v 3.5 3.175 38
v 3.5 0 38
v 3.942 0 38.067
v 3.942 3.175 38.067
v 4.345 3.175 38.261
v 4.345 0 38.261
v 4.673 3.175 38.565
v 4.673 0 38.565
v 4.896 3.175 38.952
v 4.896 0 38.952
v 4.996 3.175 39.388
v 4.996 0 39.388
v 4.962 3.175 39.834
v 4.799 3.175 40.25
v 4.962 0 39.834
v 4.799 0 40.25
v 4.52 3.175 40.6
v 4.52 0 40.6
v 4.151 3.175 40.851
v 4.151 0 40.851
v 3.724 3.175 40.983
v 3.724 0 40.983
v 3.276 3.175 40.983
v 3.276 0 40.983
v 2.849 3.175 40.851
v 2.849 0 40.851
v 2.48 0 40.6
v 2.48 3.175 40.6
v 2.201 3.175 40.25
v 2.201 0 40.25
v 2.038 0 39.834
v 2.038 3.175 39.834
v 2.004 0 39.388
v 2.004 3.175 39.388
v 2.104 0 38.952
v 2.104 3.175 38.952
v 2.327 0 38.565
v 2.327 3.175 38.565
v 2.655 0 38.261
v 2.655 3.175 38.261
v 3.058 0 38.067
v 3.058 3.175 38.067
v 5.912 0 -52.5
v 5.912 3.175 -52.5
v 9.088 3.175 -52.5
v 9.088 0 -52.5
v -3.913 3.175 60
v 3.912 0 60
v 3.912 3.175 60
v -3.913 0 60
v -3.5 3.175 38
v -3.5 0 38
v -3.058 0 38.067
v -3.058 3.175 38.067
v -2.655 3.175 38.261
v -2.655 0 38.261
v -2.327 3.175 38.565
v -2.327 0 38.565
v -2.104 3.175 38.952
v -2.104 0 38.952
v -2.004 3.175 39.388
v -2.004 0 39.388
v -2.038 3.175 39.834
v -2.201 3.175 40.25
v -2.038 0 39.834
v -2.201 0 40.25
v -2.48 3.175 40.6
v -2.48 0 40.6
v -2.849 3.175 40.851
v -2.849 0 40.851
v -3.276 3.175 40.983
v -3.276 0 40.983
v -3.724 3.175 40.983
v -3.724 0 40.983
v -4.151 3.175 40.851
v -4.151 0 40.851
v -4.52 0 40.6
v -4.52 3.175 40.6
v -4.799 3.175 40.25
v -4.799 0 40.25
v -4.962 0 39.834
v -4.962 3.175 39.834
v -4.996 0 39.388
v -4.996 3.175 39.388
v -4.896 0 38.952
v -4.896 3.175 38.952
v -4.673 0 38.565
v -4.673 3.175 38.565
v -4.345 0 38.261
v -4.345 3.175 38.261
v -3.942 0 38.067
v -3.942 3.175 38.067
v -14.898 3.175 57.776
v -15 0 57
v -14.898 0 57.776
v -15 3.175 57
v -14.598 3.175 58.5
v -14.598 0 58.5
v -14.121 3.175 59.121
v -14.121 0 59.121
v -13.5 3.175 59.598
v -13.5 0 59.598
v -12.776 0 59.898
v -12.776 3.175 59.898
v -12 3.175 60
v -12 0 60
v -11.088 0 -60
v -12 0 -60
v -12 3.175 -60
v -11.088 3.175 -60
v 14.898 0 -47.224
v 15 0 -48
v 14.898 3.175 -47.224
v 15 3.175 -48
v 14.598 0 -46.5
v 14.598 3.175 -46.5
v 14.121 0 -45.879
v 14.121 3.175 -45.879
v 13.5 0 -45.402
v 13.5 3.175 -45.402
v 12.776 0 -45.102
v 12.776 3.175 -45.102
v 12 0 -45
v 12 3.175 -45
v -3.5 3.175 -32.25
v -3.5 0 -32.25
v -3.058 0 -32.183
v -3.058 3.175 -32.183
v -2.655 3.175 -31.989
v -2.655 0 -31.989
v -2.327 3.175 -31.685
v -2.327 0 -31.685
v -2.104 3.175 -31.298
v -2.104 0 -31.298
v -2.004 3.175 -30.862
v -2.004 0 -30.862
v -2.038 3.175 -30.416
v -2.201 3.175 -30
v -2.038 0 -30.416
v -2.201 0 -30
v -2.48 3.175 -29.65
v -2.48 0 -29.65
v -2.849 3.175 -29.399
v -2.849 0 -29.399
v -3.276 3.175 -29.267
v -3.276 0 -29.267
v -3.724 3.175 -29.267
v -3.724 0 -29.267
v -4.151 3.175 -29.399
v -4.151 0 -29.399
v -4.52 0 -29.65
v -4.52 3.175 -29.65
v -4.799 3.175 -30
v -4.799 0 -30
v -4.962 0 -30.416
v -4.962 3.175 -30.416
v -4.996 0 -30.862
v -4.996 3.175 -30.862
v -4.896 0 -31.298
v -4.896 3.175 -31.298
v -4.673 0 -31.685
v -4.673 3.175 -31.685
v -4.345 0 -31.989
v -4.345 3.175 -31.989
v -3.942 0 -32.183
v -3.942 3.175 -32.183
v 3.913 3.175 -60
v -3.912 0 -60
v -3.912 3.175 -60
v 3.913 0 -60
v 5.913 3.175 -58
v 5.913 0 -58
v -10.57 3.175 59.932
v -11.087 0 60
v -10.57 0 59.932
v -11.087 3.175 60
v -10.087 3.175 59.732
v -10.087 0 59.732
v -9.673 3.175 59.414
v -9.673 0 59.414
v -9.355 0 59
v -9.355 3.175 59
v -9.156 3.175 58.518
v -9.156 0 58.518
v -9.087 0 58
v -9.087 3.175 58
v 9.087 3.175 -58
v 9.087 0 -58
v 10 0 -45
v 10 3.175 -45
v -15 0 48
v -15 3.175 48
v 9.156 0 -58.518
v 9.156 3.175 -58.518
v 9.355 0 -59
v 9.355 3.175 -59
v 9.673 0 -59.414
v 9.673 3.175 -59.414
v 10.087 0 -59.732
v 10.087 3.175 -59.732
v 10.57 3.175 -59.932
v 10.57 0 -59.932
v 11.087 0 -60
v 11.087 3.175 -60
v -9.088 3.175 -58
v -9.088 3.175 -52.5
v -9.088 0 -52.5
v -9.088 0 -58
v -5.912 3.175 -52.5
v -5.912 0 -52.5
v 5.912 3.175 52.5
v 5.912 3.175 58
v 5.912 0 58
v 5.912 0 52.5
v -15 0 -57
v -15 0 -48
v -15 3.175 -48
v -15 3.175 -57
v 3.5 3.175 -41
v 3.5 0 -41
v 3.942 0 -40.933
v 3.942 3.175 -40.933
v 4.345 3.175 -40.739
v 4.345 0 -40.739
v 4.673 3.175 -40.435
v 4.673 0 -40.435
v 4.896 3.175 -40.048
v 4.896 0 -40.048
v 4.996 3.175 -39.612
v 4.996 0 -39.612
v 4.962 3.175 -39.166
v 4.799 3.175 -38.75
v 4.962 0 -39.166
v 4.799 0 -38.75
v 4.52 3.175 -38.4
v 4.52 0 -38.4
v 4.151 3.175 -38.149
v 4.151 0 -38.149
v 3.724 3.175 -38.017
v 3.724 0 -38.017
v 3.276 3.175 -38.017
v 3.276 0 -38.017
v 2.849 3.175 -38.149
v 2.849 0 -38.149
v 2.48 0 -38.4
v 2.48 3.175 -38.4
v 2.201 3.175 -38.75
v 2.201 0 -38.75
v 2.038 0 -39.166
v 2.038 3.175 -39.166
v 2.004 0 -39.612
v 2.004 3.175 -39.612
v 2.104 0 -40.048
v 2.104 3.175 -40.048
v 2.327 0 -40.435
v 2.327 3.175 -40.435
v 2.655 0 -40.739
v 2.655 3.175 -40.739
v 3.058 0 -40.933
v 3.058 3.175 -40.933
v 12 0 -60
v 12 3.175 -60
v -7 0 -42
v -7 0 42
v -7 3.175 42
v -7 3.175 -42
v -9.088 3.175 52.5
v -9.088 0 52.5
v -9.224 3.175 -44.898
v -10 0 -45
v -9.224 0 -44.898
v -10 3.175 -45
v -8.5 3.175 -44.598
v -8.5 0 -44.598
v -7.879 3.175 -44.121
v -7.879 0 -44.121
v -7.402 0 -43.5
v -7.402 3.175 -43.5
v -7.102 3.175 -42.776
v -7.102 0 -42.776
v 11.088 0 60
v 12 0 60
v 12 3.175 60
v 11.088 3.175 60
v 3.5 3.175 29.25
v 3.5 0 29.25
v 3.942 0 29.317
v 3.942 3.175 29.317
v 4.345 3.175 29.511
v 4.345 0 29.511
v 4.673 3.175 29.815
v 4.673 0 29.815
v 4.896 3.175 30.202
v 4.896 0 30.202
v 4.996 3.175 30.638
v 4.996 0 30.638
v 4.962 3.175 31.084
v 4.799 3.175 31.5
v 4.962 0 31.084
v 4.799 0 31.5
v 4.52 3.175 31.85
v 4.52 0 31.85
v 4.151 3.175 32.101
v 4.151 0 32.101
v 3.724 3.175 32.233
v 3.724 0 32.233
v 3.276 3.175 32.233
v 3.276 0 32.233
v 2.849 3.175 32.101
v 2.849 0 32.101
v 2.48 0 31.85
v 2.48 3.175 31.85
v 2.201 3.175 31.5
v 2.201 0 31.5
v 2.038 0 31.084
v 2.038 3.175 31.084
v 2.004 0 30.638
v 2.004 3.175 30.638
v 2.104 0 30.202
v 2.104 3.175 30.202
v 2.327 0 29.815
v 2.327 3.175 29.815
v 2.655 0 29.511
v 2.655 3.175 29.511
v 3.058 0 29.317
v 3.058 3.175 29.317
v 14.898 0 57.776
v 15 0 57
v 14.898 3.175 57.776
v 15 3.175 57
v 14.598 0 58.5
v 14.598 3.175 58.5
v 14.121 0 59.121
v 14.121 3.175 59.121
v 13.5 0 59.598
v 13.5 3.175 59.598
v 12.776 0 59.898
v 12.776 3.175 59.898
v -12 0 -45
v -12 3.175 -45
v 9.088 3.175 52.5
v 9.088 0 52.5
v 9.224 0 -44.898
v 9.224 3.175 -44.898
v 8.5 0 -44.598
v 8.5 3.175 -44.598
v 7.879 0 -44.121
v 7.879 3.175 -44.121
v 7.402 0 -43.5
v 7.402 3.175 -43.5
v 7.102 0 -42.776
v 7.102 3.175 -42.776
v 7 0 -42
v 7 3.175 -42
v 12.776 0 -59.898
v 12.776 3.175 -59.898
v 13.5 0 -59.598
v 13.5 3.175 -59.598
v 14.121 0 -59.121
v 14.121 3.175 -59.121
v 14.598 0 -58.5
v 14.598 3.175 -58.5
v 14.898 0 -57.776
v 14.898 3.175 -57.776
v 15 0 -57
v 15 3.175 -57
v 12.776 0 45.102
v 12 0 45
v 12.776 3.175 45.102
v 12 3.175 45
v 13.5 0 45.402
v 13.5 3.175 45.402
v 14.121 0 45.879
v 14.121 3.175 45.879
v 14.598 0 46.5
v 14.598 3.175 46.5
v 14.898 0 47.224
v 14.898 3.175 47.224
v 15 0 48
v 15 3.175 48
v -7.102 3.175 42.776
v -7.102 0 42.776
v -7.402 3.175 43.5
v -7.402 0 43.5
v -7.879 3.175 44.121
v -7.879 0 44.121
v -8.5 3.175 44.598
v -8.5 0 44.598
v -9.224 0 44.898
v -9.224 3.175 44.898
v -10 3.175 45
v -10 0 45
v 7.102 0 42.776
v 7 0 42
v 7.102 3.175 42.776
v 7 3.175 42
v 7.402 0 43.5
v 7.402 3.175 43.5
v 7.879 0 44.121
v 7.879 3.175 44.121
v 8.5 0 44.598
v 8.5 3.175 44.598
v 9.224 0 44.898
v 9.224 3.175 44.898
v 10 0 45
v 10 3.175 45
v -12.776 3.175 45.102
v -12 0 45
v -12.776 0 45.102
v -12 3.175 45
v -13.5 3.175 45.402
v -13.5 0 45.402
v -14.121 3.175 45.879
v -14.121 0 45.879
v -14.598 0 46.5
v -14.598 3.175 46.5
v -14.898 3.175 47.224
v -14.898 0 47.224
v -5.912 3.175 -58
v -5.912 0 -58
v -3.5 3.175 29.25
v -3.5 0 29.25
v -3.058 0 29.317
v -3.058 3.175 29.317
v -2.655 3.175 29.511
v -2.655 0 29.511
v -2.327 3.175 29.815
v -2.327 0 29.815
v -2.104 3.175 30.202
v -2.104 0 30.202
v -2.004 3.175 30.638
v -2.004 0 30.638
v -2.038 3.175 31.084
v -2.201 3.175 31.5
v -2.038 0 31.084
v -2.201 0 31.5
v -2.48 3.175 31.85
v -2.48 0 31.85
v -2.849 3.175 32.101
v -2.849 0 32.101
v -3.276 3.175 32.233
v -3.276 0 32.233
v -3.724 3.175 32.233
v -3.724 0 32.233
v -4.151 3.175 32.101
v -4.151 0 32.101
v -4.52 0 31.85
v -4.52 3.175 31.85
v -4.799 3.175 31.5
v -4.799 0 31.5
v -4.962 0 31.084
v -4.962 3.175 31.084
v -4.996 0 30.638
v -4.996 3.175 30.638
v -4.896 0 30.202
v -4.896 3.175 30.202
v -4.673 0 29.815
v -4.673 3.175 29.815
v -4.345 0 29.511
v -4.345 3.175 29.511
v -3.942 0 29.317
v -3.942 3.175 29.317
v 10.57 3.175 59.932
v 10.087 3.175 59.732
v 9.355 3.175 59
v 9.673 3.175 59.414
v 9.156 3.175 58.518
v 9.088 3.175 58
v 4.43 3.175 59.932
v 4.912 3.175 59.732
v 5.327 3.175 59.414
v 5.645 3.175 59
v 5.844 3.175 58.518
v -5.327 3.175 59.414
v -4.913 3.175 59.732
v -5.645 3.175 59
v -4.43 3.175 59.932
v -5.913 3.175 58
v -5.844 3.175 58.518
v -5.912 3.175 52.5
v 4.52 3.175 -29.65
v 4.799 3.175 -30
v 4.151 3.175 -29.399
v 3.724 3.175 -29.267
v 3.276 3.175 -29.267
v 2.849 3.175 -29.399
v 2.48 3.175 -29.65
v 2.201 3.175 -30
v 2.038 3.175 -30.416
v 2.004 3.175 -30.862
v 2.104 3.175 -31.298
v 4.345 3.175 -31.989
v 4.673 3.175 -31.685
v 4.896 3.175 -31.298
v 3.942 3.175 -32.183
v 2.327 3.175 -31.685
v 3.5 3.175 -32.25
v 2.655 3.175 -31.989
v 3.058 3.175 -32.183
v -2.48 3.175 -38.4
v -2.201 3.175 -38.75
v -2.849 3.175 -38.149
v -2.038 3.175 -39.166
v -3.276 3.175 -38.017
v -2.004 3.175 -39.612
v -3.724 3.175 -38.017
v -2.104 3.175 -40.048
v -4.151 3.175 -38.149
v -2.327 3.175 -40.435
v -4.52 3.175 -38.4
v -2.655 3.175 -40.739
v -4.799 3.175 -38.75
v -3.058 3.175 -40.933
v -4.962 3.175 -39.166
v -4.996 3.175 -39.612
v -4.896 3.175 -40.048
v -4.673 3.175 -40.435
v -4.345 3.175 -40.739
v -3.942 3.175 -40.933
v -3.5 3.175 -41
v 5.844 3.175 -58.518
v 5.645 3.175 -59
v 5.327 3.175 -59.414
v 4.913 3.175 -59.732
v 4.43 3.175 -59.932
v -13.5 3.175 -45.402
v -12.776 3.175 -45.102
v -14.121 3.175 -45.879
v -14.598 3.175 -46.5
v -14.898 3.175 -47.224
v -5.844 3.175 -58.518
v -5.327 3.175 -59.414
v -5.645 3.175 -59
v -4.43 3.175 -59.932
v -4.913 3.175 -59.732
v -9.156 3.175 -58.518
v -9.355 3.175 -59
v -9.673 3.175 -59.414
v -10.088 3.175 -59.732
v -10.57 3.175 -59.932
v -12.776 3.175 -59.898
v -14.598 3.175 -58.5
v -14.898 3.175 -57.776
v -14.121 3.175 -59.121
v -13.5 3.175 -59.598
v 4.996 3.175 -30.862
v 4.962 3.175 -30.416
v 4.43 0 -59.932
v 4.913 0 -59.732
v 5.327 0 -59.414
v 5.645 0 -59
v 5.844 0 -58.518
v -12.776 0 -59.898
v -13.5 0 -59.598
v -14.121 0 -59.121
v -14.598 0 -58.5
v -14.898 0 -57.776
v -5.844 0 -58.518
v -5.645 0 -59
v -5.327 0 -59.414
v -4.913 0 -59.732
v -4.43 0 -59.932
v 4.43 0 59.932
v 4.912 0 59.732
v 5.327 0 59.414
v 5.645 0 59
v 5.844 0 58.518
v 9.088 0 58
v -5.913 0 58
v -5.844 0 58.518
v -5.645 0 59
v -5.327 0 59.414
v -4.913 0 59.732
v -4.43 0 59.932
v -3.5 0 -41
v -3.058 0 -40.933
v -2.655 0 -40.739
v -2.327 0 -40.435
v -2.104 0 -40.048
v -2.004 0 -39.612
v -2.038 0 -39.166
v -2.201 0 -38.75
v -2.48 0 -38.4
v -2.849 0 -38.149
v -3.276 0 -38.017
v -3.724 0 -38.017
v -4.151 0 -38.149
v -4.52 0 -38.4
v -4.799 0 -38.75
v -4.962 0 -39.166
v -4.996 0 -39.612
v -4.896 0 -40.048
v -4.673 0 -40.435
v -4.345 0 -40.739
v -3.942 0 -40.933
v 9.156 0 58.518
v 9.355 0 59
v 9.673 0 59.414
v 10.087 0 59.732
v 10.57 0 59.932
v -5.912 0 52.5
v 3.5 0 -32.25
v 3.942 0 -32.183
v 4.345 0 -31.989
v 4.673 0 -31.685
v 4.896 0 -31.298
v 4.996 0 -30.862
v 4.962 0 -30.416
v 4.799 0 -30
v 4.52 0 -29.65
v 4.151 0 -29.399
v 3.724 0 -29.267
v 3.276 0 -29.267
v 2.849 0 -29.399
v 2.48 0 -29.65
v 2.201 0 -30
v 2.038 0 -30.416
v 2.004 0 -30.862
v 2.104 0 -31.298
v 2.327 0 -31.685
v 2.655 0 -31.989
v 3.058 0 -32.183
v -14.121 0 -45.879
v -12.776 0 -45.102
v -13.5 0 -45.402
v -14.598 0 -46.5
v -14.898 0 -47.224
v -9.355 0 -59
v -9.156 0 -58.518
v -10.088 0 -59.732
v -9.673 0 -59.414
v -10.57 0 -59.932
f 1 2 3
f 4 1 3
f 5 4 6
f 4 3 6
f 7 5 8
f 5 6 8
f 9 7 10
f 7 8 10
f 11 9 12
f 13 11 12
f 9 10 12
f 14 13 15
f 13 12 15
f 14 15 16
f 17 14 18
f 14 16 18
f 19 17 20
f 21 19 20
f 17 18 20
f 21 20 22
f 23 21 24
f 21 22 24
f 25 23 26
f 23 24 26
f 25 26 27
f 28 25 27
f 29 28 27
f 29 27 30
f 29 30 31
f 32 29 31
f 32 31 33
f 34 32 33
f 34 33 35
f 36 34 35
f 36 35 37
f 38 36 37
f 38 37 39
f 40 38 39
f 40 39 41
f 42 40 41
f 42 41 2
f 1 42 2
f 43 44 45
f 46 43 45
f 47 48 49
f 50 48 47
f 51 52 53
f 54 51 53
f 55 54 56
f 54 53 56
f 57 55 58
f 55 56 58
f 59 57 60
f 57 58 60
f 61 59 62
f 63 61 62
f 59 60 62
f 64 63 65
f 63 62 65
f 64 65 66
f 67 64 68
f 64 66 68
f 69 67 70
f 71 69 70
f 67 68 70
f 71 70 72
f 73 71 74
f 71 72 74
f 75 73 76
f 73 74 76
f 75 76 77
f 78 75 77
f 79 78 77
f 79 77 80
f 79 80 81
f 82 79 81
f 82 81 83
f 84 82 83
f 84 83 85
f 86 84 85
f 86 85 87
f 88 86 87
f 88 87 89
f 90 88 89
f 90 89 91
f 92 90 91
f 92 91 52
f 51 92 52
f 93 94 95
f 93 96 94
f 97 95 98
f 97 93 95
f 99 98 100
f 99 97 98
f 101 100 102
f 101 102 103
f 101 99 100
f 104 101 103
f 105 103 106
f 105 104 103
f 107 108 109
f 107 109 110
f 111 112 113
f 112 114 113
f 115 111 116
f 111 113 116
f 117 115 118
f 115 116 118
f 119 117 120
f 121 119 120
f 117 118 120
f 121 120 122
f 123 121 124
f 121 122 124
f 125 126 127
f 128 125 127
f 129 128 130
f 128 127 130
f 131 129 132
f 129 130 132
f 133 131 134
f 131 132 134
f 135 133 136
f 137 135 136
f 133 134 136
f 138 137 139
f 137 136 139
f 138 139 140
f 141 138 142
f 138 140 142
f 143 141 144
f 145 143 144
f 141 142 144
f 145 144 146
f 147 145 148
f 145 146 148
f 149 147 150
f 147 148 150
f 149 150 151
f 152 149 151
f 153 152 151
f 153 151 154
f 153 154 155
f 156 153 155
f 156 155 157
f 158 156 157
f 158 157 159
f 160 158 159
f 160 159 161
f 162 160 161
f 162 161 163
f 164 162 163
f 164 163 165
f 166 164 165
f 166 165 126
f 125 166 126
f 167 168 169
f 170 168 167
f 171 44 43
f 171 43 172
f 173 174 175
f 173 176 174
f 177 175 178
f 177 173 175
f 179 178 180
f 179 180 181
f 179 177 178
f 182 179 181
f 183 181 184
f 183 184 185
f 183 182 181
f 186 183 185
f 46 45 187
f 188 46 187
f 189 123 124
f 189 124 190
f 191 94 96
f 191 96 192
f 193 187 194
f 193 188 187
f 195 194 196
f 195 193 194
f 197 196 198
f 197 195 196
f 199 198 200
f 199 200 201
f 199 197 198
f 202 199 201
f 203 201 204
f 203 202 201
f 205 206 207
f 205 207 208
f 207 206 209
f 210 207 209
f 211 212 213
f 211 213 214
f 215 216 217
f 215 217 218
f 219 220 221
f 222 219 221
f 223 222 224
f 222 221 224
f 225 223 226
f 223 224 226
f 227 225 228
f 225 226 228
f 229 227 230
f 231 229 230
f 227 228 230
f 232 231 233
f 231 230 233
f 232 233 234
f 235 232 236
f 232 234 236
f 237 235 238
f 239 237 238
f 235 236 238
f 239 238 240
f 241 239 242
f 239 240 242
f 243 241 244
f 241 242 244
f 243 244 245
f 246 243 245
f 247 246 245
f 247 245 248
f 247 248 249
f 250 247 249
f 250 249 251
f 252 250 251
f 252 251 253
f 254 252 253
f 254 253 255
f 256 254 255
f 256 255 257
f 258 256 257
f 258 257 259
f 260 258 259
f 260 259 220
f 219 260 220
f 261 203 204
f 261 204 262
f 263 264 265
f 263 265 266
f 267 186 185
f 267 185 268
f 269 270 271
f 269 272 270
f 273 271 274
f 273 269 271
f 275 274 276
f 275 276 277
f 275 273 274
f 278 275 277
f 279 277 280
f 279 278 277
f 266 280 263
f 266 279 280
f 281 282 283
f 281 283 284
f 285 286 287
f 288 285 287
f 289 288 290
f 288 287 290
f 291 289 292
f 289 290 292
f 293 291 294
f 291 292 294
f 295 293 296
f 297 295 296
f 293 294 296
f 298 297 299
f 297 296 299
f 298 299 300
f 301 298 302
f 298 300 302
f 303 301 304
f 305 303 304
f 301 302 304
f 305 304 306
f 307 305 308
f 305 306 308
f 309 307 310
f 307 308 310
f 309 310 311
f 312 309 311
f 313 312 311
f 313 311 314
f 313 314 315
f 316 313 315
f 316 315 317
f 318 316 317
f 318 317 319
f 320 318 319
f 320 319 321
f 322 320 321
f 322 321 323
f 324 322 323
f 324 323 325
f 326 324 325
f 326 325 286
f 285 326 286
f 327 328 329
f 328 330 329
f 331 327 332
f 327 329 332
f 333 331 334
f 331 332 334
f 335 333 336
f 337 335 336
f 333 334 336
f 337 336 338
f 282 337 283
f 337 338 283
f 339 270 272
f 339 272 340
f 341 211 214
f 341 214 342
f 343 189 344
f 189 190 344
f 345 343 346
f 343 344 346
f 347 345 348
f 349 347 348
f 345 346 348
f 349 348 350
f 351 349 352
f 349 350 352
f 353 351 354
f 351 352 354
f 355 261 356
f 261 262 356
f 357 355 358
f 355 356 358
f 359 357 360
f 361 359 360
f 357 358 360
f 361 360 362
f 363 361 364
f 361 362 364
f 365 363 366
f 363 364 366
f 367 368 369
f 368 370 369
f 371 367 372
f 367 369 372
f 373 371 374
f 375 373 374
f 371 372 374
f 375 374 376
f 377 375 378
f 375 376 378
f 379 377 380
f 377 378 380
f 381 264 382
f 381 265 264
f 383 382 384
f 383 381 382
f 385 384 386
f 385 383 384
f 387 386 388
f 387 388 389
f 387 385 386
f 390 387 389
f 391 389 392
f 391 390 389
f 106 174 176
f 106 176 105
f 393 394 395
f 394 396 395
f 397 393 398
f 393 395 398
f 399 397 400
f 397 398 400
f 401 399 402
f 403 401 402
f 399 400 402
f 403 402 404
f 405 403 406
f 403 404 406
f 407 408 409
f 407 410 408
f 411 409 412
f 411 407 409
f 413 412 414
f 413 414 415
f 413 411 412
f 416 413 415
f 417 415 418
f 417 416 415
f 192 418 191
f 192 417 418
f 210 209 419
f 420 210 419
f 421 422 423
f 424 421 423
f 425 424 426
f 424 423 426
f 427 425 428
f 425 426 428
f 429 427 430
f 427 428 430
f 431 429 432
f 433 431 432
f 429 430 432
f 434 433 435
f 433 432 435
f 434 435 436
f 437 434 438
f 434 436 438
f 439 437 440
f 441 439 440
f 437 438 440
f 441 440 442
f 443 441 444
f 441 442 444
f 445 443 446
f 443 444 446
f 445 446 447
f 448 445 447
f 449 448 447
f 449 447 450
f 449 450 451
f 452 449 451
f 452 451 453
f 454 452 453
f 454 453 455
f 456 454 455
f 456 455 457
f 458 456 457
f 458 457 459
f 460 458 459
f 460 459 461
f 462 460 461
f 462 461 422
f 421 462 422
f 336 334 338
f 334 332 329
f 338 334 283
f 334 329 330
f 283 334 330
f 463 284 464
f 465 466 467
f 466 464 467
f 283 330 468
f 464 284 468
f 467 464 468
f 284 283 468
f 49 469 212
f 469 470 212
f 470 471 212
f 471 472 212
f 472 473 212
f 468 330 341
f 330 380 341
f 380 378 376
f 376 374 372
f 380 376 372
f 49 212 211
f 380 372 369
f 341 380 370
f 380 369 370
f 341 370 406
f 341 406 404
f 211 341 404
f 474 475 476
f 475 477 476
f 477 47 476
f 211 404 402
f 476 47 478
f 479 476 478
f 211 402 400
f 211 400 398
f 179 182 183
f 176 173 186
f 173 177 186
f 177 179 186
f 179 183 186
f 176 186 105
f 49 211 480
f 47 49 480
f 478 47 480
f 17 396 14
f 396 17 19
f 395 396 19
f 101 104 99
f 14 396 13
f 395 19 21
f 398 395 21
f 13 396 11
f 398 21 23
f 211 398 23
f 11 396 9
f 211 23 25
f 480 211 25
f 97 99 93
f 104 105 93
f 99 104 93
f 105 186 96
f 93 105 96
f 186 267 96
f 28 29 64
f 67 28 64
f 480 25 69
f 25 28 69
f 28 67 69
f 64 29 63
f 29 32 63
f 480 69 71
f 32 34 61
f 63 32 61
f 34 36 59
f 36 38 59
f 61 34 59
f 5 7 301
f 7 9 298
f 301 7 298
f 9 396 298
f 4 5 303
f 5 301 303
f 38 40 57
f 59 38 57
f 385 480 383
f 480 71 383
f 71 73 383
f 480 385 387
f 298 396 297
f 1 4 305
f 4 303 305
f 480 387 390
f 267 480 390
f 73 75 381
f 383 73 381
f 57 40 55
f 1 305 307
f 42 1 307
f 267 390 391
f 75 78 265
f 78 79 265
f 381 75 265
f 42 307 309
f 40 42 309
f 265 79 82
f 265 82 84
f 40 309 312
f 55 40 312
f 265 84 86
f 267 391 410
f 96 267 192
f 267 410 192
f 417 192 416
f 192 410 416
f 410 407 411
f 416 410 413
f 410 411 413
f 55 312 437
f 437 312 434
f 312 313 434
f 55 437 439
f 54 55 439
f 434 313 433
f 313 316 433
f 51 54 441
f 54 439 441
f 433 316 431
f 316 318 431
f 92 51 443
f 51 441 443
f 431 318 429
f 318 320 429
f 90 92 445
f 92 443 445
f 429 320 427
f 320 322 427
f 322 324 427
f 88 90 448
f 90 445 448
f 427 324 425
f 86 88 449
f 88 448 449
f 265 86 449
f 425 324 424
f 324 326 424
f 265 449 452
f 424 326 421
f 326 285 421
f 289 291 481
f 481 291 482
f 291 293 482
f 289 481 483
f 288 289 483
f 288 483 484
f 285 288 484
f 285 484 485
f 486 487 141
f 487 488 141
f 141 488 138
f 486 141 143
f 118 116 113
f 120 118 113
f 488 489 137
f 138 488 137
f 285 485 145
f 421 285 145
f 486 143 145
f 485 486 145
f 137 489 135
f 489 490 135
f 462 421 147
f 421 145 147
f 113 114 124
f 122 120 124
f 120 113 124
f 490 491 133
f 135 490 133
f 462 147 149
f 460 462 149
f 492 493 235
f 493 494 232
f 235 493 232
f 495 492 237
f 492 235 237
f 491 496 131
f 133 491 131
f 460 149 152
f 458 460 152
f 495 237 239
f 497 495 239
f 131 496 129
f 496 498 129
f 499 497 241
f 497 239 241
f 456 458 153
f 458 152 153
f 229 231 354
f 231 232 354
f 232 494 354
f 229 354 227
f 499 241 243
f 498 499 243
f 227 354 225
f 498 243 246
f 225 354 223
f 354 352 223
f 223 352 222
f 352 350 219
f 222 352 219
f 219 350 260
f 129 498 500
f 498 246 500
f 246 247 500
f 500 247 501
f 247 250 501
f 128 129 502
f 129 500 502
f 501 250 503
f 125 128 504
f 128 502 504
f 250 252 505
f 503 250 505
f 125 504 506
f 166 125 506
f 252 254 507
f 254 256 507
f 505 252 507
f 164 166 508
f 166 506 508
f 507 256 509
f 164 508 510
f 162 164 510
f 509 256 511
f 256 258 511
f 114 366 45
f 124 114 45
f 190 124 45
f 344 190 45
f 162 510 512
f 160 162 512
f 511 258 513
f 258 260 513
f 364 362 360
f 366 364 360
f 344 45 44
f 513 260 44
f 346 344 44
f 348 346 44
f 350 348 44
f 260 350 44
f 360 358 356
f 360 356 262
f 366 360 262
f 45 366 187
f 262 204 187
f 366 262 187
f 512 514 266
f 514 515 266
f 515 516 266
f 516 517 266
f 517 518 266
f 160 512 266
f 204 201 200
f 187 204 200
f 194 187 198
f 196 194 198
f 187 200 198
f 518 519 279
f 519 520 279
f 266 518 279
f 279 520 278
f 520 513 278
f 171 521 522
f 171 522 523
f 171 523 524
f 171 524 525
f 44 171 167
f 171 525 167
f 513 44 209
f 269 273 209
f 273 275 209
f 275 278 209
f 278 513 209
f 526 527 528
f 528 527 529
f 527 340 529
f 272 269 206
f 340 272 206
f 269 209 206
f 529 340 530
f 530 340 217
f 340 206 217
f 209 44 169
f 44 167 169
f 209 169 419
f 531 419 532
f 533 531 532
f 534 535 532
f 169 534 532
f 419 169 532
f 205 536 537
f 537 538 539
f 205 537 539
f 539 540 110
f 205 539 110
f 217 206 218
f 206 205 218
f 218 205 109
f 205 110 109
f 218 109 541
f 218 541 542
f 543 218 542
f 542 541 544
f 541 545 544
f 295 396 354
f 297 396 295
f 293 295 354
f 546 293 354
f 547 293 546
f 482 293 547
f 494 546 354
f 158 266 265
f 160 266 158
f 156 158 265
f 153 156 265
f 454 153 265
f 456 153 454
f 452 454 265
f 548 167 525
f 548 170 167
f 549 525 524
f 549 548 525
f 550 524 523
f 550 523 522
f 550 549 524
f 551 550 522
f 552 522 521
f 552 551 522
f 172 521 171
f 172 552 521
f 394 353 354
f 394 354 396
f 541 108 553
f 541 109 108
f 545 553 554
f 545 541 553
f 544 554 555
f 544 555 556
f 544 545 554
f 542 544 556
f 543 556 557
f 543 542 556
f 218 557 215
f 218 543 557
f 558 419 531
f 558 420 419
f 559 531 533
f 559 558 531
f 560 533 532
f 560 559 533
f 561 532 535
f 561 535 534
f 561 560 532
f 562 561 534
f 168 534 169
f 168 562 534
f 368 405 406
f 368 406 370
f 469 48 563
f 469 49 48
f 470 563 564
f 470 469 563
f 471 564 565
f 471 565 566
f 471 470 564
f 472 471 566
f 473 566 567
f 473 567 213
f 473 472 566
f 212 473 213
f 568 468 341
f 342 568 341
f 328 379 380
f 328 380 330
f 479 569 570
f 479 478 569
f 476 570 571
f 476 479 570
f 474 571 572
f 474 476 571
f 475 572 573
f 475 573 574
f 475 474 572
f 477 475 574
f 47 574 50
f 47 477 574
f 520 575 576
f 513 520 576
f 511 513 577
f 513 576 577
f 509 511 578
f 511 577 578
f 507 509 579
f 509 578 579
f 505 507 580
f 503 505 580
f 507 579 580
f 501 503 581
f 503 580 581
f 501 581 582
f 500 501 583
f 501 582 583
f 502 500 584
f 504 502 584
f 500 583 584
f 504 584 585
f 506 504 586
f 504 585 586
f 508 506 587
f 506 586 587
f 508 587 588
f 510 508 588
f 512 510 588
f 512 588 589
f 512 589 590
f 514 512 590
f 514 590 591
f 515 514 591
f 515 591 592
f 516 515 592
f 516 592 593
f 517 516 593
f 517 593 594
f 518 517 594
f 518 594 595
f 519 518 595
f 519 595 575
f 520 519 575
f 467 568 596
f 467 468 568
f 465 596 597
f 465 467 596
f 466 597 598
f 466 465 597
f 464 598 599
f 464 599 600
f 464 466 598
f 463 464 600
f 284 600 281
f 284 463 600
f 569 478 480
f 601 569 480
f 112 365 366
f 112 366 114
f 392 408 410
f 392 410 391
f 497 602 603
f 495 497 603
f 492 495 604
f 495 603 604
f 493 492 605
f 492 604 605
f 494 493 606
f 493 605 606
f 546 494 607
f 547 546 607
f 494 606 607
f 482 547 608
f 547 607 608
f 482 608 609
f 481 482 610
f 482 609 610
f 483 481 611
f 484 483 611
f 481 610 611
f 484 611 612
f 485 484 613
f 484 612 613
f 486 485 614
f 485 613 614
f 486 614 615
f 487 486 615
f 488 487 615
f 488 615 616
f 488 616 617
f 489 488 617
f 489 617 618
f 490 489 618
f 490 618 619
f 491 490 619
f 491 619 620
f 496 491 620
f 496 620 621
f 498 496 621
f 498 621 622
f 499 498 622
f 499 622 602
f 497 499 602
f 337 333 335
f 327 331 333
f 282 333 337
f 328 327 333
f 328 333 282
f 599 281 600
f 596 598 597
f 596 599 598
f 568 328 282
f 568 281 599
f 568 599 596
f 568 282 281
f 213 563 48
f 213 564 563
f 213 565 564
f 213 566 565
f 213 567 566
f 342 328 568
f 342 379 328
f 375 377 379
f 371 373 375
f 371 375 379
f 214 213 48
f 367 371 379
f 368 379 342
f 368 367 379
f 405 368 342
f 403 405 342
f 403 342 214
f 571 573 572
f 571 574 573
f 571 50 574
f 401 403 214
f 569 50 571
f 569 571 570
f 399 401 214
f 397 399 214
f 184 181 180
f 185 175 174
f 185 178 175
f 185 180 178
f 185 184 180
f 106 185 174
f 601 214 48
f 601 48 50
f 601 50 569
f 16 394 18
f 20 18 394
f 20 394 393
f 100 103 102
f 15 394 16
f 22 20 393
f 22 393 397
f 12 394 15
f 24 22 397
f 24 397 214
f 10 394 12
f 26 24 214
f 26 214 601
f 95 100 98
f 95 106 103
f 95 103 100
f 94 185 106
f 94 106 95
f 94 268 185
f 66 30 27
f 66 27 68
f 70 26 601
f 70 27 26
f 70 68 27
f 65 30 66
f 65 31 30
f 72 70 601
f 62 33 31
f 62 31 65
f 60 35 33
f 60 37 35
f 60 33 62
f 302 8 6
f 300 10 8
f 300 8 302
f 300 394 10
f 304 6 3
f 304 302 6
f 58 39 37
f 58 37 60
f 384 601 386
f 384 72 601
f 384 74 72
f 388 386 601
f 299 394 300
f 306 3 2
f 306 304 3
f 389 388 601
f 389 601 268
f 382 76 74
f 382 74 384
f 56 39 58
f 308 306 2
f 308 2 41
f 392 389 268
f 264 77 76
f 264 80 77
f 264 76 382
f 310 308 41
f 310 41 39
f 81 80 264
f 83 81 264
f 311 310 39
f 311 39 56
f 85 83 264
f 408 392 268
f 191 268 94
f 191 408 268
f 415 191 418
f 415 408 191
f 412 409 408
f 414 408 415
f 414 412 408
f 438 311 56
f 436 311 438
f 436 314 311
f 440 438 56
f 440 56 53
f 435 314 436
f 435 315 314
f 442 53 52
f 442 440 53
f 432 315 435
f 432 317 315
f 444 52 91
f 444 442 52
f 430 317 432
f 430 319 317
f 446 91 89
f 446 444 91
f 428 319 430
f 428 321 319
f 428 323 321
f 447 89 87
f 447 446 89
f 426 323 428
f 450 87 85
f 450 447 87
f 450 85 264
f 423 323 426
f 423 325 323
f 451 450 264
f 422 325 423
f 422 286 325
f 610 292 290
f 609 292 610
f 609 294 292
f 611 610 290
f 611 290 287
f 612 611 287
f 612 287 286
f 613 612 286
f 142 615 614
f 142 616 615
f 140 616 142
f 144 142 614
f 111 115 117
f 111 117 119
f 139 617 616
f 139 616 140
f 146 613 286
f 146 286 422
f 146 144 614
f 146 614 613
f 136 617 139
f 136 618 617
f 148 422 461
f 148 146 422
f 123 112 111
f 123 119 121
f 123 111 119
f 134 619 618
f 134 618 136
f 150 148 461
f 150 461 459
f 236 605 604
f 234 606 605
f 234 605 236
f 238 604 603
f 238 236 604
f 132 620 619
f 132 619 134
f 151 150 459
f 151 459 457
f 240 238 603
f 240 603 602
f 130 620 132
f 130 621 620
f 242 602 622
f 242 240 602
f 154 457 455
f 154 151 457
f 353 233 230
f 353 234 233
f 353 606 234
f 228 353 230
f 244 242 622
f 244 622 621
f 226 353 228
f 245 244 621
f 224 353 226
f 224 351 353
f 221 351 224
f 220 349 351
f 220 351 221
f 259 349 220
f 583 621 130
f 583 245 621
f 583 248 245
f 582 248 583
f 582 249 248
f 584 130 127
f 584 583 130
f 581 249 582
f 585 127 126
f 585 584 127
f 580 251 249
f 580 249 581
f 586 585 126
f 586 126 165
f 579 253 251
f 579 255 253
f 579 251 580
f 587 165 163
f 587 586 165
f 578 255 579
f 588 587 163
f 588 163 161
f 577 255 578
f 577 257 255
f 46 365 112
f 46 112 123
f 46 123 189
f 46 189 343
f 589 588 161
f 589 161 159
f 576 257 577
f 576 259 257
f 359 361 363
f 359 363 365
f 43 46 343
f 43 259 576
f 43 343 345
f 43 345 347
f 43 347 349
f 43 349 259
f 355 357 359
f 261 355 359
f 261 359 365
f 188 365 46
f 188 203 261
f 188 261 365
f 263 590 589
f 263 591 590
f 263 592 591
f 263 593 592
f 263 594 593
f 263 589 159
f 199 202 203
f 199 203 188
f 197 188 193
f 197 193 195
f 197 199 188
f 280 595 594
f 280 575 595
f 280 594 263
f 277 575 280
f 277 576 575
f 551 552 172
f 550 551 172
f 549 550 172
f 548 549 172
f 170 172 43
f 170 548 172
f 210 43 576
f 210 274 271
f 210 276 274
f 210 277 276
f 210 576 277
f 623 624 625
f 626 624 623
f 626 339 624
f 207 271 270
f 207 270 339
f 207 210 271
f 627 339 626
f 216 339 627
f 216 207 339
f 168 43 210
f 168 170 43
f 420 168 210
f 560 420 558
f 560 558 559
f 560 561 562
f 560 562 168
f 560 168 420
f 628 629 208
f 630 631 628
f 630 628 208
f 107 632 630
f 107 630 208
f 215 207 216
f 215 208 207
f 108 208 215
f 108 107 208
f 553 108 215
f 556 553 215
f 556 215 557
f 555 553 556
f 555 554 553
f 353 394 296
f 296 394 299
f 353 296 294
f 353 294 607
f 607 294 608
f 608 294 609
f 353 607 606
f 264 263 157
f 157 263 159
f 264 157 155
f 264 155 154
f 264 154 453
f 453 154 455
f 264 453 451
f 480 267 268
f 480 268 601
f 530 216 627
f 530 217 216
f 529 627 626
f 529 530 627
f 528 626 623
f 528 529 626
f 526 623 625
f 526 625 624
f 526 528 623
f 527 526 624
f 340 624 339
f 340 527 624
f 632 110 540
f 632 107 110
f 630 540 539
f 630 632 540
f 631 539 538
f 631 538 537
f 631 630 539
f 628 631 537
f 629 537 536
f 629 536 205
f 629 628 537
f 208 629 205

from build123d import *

# Parameters (mm, degrees)
BOSS_EXTRUDE1_DEPTH = 3.175
SKETCH2_W           = 3.175
SKETCH2_H           = 15
CUT_EXTRUDE1_DEPTH  = 62.928027782
SKETCH5_R           = 1.5
CUT_EXTRUDE2_DEPTH  = 10
FILLET1_R           = 2
FILLET2_R           = 3


with BuildPart() as part:
    # Sketch1 → Boss-Extrude1 (new body)
    with BuildSketch(Plane(origin=(0, 0, 0), x_dir=(1, 0, 0), z_dir=(0, 1, 0))):
        Polygon((-15, 60), (15, 60), (15, 45), (7, 45), (7, -45), (15, -45), (15, -60), (-15, -60), (-15, -45), (-7, -45), (-7, 45), (-15, 45), align=None)
    extrude(amount=BOSS_EXTRUDE1_DEPTH)

    # Sketch2 → Cut-Extrude1 (cut, through all)
    with BuildSketch(Plane(origin=(0, 3.175, 0), x_dir=(1, 0, 0), z_dir=(0, 1, 0))):
        with Locations((7.5, 60)):
            Rectangle(SKETCH2_W, SKETCH2_H)
        with Locations((-7.5, 60)):
            Rectangle(SKETCH2_W, SKETCH2_H)
        with Locations((7.5, -60)):
            Rectangle(SKETCH2_W, SKETCH2_H)
        with Locations((-7.5, -60)):
            Rectangle(SKETCH2_W, SKETCH2_H)
    extrude(amount=-CUT_EXTRUDE1_DEPTH, mode=Mode.SUBTRACT)

    # Sketch5 → Cut-Extrude2 (cut)
    with BuildSketch(Plane.XZ):
        with Locations(Location((3.5, -39.5, 0), (0, 0, 270))):
            Circle(SKETCH5_R)
        with Locations(Location((-3.5, -39.5, 0), (0, 0, 270))):
            Circle(SKETCH5_R)
        with Locations(Location((-3.5, -30.75, 0), (0, 0, 270))):
            Circle(SKETCH5_R)
        with Locations(Location((3.5, 30.75, 0), (0, 0, 270))):
            Circle(SKETCH5_R)
        with Locations(Location((-3.5, 30.75, 0), (0, 0, 270))):
            Circle(SKETCH5_R)
        with Locations(Location((3.5, 39.5, 0), (0, 0, 270))):
            Circle(SKETCH5_R)
        with Locations(Location((-3.5, 39.5, 0), (0, 0, 270))):
            Circle(SKETCH5_R)
        with Locations(Location((3.5, -30.75, 0), (0, 0, 270))):
            Circle(SKETCH5_R)
    extrude(amount=-CUT_EXTRUDE2_DEPTH, mode=Mode.SUBTRACT)

    # Fillet1
    fillet1_edges = [part.edges().sort_by_distance(p)[0] for p in [
        (-5.9125, 1.5875, -60),
        (-9.0875, 1.5875, -60),
        (5.9125, 1.5875, 60),
        (9.0875, 1.5875, 60),
        (-5.9125, 1.5875, 60),
        (-9.0875, 1.5875, 60),
        (9.0875, 1.5875, -60),
        (5.9125, 1.5875, -60),
    ]]
    fillet(fillet1_edges, radius=FILLET1_R)

    # Fillet2
    fillet2_edges = [part.edges().sort_by_distance(p)[0] for p in [
        (7, 1.5875, -45),
        (7, 1.5875, 45),
        (15, 1.5875, 45),
        (15, 1.5875, 60),
        (-15, 1.5875, 60),
        (-15, 1.5875, 45),
        (-7, 1.5875, 45),
        (-7, 1.5875, -45),
        (-15, 1.5875, -45),
        (-15, 1.5875, -60),
        (15, 1.5875, -60),
        (15, 1.5875, -45),
    ]]
    fillet(fillet2_edges, radius=FILLET2_R)


solid = part.part
